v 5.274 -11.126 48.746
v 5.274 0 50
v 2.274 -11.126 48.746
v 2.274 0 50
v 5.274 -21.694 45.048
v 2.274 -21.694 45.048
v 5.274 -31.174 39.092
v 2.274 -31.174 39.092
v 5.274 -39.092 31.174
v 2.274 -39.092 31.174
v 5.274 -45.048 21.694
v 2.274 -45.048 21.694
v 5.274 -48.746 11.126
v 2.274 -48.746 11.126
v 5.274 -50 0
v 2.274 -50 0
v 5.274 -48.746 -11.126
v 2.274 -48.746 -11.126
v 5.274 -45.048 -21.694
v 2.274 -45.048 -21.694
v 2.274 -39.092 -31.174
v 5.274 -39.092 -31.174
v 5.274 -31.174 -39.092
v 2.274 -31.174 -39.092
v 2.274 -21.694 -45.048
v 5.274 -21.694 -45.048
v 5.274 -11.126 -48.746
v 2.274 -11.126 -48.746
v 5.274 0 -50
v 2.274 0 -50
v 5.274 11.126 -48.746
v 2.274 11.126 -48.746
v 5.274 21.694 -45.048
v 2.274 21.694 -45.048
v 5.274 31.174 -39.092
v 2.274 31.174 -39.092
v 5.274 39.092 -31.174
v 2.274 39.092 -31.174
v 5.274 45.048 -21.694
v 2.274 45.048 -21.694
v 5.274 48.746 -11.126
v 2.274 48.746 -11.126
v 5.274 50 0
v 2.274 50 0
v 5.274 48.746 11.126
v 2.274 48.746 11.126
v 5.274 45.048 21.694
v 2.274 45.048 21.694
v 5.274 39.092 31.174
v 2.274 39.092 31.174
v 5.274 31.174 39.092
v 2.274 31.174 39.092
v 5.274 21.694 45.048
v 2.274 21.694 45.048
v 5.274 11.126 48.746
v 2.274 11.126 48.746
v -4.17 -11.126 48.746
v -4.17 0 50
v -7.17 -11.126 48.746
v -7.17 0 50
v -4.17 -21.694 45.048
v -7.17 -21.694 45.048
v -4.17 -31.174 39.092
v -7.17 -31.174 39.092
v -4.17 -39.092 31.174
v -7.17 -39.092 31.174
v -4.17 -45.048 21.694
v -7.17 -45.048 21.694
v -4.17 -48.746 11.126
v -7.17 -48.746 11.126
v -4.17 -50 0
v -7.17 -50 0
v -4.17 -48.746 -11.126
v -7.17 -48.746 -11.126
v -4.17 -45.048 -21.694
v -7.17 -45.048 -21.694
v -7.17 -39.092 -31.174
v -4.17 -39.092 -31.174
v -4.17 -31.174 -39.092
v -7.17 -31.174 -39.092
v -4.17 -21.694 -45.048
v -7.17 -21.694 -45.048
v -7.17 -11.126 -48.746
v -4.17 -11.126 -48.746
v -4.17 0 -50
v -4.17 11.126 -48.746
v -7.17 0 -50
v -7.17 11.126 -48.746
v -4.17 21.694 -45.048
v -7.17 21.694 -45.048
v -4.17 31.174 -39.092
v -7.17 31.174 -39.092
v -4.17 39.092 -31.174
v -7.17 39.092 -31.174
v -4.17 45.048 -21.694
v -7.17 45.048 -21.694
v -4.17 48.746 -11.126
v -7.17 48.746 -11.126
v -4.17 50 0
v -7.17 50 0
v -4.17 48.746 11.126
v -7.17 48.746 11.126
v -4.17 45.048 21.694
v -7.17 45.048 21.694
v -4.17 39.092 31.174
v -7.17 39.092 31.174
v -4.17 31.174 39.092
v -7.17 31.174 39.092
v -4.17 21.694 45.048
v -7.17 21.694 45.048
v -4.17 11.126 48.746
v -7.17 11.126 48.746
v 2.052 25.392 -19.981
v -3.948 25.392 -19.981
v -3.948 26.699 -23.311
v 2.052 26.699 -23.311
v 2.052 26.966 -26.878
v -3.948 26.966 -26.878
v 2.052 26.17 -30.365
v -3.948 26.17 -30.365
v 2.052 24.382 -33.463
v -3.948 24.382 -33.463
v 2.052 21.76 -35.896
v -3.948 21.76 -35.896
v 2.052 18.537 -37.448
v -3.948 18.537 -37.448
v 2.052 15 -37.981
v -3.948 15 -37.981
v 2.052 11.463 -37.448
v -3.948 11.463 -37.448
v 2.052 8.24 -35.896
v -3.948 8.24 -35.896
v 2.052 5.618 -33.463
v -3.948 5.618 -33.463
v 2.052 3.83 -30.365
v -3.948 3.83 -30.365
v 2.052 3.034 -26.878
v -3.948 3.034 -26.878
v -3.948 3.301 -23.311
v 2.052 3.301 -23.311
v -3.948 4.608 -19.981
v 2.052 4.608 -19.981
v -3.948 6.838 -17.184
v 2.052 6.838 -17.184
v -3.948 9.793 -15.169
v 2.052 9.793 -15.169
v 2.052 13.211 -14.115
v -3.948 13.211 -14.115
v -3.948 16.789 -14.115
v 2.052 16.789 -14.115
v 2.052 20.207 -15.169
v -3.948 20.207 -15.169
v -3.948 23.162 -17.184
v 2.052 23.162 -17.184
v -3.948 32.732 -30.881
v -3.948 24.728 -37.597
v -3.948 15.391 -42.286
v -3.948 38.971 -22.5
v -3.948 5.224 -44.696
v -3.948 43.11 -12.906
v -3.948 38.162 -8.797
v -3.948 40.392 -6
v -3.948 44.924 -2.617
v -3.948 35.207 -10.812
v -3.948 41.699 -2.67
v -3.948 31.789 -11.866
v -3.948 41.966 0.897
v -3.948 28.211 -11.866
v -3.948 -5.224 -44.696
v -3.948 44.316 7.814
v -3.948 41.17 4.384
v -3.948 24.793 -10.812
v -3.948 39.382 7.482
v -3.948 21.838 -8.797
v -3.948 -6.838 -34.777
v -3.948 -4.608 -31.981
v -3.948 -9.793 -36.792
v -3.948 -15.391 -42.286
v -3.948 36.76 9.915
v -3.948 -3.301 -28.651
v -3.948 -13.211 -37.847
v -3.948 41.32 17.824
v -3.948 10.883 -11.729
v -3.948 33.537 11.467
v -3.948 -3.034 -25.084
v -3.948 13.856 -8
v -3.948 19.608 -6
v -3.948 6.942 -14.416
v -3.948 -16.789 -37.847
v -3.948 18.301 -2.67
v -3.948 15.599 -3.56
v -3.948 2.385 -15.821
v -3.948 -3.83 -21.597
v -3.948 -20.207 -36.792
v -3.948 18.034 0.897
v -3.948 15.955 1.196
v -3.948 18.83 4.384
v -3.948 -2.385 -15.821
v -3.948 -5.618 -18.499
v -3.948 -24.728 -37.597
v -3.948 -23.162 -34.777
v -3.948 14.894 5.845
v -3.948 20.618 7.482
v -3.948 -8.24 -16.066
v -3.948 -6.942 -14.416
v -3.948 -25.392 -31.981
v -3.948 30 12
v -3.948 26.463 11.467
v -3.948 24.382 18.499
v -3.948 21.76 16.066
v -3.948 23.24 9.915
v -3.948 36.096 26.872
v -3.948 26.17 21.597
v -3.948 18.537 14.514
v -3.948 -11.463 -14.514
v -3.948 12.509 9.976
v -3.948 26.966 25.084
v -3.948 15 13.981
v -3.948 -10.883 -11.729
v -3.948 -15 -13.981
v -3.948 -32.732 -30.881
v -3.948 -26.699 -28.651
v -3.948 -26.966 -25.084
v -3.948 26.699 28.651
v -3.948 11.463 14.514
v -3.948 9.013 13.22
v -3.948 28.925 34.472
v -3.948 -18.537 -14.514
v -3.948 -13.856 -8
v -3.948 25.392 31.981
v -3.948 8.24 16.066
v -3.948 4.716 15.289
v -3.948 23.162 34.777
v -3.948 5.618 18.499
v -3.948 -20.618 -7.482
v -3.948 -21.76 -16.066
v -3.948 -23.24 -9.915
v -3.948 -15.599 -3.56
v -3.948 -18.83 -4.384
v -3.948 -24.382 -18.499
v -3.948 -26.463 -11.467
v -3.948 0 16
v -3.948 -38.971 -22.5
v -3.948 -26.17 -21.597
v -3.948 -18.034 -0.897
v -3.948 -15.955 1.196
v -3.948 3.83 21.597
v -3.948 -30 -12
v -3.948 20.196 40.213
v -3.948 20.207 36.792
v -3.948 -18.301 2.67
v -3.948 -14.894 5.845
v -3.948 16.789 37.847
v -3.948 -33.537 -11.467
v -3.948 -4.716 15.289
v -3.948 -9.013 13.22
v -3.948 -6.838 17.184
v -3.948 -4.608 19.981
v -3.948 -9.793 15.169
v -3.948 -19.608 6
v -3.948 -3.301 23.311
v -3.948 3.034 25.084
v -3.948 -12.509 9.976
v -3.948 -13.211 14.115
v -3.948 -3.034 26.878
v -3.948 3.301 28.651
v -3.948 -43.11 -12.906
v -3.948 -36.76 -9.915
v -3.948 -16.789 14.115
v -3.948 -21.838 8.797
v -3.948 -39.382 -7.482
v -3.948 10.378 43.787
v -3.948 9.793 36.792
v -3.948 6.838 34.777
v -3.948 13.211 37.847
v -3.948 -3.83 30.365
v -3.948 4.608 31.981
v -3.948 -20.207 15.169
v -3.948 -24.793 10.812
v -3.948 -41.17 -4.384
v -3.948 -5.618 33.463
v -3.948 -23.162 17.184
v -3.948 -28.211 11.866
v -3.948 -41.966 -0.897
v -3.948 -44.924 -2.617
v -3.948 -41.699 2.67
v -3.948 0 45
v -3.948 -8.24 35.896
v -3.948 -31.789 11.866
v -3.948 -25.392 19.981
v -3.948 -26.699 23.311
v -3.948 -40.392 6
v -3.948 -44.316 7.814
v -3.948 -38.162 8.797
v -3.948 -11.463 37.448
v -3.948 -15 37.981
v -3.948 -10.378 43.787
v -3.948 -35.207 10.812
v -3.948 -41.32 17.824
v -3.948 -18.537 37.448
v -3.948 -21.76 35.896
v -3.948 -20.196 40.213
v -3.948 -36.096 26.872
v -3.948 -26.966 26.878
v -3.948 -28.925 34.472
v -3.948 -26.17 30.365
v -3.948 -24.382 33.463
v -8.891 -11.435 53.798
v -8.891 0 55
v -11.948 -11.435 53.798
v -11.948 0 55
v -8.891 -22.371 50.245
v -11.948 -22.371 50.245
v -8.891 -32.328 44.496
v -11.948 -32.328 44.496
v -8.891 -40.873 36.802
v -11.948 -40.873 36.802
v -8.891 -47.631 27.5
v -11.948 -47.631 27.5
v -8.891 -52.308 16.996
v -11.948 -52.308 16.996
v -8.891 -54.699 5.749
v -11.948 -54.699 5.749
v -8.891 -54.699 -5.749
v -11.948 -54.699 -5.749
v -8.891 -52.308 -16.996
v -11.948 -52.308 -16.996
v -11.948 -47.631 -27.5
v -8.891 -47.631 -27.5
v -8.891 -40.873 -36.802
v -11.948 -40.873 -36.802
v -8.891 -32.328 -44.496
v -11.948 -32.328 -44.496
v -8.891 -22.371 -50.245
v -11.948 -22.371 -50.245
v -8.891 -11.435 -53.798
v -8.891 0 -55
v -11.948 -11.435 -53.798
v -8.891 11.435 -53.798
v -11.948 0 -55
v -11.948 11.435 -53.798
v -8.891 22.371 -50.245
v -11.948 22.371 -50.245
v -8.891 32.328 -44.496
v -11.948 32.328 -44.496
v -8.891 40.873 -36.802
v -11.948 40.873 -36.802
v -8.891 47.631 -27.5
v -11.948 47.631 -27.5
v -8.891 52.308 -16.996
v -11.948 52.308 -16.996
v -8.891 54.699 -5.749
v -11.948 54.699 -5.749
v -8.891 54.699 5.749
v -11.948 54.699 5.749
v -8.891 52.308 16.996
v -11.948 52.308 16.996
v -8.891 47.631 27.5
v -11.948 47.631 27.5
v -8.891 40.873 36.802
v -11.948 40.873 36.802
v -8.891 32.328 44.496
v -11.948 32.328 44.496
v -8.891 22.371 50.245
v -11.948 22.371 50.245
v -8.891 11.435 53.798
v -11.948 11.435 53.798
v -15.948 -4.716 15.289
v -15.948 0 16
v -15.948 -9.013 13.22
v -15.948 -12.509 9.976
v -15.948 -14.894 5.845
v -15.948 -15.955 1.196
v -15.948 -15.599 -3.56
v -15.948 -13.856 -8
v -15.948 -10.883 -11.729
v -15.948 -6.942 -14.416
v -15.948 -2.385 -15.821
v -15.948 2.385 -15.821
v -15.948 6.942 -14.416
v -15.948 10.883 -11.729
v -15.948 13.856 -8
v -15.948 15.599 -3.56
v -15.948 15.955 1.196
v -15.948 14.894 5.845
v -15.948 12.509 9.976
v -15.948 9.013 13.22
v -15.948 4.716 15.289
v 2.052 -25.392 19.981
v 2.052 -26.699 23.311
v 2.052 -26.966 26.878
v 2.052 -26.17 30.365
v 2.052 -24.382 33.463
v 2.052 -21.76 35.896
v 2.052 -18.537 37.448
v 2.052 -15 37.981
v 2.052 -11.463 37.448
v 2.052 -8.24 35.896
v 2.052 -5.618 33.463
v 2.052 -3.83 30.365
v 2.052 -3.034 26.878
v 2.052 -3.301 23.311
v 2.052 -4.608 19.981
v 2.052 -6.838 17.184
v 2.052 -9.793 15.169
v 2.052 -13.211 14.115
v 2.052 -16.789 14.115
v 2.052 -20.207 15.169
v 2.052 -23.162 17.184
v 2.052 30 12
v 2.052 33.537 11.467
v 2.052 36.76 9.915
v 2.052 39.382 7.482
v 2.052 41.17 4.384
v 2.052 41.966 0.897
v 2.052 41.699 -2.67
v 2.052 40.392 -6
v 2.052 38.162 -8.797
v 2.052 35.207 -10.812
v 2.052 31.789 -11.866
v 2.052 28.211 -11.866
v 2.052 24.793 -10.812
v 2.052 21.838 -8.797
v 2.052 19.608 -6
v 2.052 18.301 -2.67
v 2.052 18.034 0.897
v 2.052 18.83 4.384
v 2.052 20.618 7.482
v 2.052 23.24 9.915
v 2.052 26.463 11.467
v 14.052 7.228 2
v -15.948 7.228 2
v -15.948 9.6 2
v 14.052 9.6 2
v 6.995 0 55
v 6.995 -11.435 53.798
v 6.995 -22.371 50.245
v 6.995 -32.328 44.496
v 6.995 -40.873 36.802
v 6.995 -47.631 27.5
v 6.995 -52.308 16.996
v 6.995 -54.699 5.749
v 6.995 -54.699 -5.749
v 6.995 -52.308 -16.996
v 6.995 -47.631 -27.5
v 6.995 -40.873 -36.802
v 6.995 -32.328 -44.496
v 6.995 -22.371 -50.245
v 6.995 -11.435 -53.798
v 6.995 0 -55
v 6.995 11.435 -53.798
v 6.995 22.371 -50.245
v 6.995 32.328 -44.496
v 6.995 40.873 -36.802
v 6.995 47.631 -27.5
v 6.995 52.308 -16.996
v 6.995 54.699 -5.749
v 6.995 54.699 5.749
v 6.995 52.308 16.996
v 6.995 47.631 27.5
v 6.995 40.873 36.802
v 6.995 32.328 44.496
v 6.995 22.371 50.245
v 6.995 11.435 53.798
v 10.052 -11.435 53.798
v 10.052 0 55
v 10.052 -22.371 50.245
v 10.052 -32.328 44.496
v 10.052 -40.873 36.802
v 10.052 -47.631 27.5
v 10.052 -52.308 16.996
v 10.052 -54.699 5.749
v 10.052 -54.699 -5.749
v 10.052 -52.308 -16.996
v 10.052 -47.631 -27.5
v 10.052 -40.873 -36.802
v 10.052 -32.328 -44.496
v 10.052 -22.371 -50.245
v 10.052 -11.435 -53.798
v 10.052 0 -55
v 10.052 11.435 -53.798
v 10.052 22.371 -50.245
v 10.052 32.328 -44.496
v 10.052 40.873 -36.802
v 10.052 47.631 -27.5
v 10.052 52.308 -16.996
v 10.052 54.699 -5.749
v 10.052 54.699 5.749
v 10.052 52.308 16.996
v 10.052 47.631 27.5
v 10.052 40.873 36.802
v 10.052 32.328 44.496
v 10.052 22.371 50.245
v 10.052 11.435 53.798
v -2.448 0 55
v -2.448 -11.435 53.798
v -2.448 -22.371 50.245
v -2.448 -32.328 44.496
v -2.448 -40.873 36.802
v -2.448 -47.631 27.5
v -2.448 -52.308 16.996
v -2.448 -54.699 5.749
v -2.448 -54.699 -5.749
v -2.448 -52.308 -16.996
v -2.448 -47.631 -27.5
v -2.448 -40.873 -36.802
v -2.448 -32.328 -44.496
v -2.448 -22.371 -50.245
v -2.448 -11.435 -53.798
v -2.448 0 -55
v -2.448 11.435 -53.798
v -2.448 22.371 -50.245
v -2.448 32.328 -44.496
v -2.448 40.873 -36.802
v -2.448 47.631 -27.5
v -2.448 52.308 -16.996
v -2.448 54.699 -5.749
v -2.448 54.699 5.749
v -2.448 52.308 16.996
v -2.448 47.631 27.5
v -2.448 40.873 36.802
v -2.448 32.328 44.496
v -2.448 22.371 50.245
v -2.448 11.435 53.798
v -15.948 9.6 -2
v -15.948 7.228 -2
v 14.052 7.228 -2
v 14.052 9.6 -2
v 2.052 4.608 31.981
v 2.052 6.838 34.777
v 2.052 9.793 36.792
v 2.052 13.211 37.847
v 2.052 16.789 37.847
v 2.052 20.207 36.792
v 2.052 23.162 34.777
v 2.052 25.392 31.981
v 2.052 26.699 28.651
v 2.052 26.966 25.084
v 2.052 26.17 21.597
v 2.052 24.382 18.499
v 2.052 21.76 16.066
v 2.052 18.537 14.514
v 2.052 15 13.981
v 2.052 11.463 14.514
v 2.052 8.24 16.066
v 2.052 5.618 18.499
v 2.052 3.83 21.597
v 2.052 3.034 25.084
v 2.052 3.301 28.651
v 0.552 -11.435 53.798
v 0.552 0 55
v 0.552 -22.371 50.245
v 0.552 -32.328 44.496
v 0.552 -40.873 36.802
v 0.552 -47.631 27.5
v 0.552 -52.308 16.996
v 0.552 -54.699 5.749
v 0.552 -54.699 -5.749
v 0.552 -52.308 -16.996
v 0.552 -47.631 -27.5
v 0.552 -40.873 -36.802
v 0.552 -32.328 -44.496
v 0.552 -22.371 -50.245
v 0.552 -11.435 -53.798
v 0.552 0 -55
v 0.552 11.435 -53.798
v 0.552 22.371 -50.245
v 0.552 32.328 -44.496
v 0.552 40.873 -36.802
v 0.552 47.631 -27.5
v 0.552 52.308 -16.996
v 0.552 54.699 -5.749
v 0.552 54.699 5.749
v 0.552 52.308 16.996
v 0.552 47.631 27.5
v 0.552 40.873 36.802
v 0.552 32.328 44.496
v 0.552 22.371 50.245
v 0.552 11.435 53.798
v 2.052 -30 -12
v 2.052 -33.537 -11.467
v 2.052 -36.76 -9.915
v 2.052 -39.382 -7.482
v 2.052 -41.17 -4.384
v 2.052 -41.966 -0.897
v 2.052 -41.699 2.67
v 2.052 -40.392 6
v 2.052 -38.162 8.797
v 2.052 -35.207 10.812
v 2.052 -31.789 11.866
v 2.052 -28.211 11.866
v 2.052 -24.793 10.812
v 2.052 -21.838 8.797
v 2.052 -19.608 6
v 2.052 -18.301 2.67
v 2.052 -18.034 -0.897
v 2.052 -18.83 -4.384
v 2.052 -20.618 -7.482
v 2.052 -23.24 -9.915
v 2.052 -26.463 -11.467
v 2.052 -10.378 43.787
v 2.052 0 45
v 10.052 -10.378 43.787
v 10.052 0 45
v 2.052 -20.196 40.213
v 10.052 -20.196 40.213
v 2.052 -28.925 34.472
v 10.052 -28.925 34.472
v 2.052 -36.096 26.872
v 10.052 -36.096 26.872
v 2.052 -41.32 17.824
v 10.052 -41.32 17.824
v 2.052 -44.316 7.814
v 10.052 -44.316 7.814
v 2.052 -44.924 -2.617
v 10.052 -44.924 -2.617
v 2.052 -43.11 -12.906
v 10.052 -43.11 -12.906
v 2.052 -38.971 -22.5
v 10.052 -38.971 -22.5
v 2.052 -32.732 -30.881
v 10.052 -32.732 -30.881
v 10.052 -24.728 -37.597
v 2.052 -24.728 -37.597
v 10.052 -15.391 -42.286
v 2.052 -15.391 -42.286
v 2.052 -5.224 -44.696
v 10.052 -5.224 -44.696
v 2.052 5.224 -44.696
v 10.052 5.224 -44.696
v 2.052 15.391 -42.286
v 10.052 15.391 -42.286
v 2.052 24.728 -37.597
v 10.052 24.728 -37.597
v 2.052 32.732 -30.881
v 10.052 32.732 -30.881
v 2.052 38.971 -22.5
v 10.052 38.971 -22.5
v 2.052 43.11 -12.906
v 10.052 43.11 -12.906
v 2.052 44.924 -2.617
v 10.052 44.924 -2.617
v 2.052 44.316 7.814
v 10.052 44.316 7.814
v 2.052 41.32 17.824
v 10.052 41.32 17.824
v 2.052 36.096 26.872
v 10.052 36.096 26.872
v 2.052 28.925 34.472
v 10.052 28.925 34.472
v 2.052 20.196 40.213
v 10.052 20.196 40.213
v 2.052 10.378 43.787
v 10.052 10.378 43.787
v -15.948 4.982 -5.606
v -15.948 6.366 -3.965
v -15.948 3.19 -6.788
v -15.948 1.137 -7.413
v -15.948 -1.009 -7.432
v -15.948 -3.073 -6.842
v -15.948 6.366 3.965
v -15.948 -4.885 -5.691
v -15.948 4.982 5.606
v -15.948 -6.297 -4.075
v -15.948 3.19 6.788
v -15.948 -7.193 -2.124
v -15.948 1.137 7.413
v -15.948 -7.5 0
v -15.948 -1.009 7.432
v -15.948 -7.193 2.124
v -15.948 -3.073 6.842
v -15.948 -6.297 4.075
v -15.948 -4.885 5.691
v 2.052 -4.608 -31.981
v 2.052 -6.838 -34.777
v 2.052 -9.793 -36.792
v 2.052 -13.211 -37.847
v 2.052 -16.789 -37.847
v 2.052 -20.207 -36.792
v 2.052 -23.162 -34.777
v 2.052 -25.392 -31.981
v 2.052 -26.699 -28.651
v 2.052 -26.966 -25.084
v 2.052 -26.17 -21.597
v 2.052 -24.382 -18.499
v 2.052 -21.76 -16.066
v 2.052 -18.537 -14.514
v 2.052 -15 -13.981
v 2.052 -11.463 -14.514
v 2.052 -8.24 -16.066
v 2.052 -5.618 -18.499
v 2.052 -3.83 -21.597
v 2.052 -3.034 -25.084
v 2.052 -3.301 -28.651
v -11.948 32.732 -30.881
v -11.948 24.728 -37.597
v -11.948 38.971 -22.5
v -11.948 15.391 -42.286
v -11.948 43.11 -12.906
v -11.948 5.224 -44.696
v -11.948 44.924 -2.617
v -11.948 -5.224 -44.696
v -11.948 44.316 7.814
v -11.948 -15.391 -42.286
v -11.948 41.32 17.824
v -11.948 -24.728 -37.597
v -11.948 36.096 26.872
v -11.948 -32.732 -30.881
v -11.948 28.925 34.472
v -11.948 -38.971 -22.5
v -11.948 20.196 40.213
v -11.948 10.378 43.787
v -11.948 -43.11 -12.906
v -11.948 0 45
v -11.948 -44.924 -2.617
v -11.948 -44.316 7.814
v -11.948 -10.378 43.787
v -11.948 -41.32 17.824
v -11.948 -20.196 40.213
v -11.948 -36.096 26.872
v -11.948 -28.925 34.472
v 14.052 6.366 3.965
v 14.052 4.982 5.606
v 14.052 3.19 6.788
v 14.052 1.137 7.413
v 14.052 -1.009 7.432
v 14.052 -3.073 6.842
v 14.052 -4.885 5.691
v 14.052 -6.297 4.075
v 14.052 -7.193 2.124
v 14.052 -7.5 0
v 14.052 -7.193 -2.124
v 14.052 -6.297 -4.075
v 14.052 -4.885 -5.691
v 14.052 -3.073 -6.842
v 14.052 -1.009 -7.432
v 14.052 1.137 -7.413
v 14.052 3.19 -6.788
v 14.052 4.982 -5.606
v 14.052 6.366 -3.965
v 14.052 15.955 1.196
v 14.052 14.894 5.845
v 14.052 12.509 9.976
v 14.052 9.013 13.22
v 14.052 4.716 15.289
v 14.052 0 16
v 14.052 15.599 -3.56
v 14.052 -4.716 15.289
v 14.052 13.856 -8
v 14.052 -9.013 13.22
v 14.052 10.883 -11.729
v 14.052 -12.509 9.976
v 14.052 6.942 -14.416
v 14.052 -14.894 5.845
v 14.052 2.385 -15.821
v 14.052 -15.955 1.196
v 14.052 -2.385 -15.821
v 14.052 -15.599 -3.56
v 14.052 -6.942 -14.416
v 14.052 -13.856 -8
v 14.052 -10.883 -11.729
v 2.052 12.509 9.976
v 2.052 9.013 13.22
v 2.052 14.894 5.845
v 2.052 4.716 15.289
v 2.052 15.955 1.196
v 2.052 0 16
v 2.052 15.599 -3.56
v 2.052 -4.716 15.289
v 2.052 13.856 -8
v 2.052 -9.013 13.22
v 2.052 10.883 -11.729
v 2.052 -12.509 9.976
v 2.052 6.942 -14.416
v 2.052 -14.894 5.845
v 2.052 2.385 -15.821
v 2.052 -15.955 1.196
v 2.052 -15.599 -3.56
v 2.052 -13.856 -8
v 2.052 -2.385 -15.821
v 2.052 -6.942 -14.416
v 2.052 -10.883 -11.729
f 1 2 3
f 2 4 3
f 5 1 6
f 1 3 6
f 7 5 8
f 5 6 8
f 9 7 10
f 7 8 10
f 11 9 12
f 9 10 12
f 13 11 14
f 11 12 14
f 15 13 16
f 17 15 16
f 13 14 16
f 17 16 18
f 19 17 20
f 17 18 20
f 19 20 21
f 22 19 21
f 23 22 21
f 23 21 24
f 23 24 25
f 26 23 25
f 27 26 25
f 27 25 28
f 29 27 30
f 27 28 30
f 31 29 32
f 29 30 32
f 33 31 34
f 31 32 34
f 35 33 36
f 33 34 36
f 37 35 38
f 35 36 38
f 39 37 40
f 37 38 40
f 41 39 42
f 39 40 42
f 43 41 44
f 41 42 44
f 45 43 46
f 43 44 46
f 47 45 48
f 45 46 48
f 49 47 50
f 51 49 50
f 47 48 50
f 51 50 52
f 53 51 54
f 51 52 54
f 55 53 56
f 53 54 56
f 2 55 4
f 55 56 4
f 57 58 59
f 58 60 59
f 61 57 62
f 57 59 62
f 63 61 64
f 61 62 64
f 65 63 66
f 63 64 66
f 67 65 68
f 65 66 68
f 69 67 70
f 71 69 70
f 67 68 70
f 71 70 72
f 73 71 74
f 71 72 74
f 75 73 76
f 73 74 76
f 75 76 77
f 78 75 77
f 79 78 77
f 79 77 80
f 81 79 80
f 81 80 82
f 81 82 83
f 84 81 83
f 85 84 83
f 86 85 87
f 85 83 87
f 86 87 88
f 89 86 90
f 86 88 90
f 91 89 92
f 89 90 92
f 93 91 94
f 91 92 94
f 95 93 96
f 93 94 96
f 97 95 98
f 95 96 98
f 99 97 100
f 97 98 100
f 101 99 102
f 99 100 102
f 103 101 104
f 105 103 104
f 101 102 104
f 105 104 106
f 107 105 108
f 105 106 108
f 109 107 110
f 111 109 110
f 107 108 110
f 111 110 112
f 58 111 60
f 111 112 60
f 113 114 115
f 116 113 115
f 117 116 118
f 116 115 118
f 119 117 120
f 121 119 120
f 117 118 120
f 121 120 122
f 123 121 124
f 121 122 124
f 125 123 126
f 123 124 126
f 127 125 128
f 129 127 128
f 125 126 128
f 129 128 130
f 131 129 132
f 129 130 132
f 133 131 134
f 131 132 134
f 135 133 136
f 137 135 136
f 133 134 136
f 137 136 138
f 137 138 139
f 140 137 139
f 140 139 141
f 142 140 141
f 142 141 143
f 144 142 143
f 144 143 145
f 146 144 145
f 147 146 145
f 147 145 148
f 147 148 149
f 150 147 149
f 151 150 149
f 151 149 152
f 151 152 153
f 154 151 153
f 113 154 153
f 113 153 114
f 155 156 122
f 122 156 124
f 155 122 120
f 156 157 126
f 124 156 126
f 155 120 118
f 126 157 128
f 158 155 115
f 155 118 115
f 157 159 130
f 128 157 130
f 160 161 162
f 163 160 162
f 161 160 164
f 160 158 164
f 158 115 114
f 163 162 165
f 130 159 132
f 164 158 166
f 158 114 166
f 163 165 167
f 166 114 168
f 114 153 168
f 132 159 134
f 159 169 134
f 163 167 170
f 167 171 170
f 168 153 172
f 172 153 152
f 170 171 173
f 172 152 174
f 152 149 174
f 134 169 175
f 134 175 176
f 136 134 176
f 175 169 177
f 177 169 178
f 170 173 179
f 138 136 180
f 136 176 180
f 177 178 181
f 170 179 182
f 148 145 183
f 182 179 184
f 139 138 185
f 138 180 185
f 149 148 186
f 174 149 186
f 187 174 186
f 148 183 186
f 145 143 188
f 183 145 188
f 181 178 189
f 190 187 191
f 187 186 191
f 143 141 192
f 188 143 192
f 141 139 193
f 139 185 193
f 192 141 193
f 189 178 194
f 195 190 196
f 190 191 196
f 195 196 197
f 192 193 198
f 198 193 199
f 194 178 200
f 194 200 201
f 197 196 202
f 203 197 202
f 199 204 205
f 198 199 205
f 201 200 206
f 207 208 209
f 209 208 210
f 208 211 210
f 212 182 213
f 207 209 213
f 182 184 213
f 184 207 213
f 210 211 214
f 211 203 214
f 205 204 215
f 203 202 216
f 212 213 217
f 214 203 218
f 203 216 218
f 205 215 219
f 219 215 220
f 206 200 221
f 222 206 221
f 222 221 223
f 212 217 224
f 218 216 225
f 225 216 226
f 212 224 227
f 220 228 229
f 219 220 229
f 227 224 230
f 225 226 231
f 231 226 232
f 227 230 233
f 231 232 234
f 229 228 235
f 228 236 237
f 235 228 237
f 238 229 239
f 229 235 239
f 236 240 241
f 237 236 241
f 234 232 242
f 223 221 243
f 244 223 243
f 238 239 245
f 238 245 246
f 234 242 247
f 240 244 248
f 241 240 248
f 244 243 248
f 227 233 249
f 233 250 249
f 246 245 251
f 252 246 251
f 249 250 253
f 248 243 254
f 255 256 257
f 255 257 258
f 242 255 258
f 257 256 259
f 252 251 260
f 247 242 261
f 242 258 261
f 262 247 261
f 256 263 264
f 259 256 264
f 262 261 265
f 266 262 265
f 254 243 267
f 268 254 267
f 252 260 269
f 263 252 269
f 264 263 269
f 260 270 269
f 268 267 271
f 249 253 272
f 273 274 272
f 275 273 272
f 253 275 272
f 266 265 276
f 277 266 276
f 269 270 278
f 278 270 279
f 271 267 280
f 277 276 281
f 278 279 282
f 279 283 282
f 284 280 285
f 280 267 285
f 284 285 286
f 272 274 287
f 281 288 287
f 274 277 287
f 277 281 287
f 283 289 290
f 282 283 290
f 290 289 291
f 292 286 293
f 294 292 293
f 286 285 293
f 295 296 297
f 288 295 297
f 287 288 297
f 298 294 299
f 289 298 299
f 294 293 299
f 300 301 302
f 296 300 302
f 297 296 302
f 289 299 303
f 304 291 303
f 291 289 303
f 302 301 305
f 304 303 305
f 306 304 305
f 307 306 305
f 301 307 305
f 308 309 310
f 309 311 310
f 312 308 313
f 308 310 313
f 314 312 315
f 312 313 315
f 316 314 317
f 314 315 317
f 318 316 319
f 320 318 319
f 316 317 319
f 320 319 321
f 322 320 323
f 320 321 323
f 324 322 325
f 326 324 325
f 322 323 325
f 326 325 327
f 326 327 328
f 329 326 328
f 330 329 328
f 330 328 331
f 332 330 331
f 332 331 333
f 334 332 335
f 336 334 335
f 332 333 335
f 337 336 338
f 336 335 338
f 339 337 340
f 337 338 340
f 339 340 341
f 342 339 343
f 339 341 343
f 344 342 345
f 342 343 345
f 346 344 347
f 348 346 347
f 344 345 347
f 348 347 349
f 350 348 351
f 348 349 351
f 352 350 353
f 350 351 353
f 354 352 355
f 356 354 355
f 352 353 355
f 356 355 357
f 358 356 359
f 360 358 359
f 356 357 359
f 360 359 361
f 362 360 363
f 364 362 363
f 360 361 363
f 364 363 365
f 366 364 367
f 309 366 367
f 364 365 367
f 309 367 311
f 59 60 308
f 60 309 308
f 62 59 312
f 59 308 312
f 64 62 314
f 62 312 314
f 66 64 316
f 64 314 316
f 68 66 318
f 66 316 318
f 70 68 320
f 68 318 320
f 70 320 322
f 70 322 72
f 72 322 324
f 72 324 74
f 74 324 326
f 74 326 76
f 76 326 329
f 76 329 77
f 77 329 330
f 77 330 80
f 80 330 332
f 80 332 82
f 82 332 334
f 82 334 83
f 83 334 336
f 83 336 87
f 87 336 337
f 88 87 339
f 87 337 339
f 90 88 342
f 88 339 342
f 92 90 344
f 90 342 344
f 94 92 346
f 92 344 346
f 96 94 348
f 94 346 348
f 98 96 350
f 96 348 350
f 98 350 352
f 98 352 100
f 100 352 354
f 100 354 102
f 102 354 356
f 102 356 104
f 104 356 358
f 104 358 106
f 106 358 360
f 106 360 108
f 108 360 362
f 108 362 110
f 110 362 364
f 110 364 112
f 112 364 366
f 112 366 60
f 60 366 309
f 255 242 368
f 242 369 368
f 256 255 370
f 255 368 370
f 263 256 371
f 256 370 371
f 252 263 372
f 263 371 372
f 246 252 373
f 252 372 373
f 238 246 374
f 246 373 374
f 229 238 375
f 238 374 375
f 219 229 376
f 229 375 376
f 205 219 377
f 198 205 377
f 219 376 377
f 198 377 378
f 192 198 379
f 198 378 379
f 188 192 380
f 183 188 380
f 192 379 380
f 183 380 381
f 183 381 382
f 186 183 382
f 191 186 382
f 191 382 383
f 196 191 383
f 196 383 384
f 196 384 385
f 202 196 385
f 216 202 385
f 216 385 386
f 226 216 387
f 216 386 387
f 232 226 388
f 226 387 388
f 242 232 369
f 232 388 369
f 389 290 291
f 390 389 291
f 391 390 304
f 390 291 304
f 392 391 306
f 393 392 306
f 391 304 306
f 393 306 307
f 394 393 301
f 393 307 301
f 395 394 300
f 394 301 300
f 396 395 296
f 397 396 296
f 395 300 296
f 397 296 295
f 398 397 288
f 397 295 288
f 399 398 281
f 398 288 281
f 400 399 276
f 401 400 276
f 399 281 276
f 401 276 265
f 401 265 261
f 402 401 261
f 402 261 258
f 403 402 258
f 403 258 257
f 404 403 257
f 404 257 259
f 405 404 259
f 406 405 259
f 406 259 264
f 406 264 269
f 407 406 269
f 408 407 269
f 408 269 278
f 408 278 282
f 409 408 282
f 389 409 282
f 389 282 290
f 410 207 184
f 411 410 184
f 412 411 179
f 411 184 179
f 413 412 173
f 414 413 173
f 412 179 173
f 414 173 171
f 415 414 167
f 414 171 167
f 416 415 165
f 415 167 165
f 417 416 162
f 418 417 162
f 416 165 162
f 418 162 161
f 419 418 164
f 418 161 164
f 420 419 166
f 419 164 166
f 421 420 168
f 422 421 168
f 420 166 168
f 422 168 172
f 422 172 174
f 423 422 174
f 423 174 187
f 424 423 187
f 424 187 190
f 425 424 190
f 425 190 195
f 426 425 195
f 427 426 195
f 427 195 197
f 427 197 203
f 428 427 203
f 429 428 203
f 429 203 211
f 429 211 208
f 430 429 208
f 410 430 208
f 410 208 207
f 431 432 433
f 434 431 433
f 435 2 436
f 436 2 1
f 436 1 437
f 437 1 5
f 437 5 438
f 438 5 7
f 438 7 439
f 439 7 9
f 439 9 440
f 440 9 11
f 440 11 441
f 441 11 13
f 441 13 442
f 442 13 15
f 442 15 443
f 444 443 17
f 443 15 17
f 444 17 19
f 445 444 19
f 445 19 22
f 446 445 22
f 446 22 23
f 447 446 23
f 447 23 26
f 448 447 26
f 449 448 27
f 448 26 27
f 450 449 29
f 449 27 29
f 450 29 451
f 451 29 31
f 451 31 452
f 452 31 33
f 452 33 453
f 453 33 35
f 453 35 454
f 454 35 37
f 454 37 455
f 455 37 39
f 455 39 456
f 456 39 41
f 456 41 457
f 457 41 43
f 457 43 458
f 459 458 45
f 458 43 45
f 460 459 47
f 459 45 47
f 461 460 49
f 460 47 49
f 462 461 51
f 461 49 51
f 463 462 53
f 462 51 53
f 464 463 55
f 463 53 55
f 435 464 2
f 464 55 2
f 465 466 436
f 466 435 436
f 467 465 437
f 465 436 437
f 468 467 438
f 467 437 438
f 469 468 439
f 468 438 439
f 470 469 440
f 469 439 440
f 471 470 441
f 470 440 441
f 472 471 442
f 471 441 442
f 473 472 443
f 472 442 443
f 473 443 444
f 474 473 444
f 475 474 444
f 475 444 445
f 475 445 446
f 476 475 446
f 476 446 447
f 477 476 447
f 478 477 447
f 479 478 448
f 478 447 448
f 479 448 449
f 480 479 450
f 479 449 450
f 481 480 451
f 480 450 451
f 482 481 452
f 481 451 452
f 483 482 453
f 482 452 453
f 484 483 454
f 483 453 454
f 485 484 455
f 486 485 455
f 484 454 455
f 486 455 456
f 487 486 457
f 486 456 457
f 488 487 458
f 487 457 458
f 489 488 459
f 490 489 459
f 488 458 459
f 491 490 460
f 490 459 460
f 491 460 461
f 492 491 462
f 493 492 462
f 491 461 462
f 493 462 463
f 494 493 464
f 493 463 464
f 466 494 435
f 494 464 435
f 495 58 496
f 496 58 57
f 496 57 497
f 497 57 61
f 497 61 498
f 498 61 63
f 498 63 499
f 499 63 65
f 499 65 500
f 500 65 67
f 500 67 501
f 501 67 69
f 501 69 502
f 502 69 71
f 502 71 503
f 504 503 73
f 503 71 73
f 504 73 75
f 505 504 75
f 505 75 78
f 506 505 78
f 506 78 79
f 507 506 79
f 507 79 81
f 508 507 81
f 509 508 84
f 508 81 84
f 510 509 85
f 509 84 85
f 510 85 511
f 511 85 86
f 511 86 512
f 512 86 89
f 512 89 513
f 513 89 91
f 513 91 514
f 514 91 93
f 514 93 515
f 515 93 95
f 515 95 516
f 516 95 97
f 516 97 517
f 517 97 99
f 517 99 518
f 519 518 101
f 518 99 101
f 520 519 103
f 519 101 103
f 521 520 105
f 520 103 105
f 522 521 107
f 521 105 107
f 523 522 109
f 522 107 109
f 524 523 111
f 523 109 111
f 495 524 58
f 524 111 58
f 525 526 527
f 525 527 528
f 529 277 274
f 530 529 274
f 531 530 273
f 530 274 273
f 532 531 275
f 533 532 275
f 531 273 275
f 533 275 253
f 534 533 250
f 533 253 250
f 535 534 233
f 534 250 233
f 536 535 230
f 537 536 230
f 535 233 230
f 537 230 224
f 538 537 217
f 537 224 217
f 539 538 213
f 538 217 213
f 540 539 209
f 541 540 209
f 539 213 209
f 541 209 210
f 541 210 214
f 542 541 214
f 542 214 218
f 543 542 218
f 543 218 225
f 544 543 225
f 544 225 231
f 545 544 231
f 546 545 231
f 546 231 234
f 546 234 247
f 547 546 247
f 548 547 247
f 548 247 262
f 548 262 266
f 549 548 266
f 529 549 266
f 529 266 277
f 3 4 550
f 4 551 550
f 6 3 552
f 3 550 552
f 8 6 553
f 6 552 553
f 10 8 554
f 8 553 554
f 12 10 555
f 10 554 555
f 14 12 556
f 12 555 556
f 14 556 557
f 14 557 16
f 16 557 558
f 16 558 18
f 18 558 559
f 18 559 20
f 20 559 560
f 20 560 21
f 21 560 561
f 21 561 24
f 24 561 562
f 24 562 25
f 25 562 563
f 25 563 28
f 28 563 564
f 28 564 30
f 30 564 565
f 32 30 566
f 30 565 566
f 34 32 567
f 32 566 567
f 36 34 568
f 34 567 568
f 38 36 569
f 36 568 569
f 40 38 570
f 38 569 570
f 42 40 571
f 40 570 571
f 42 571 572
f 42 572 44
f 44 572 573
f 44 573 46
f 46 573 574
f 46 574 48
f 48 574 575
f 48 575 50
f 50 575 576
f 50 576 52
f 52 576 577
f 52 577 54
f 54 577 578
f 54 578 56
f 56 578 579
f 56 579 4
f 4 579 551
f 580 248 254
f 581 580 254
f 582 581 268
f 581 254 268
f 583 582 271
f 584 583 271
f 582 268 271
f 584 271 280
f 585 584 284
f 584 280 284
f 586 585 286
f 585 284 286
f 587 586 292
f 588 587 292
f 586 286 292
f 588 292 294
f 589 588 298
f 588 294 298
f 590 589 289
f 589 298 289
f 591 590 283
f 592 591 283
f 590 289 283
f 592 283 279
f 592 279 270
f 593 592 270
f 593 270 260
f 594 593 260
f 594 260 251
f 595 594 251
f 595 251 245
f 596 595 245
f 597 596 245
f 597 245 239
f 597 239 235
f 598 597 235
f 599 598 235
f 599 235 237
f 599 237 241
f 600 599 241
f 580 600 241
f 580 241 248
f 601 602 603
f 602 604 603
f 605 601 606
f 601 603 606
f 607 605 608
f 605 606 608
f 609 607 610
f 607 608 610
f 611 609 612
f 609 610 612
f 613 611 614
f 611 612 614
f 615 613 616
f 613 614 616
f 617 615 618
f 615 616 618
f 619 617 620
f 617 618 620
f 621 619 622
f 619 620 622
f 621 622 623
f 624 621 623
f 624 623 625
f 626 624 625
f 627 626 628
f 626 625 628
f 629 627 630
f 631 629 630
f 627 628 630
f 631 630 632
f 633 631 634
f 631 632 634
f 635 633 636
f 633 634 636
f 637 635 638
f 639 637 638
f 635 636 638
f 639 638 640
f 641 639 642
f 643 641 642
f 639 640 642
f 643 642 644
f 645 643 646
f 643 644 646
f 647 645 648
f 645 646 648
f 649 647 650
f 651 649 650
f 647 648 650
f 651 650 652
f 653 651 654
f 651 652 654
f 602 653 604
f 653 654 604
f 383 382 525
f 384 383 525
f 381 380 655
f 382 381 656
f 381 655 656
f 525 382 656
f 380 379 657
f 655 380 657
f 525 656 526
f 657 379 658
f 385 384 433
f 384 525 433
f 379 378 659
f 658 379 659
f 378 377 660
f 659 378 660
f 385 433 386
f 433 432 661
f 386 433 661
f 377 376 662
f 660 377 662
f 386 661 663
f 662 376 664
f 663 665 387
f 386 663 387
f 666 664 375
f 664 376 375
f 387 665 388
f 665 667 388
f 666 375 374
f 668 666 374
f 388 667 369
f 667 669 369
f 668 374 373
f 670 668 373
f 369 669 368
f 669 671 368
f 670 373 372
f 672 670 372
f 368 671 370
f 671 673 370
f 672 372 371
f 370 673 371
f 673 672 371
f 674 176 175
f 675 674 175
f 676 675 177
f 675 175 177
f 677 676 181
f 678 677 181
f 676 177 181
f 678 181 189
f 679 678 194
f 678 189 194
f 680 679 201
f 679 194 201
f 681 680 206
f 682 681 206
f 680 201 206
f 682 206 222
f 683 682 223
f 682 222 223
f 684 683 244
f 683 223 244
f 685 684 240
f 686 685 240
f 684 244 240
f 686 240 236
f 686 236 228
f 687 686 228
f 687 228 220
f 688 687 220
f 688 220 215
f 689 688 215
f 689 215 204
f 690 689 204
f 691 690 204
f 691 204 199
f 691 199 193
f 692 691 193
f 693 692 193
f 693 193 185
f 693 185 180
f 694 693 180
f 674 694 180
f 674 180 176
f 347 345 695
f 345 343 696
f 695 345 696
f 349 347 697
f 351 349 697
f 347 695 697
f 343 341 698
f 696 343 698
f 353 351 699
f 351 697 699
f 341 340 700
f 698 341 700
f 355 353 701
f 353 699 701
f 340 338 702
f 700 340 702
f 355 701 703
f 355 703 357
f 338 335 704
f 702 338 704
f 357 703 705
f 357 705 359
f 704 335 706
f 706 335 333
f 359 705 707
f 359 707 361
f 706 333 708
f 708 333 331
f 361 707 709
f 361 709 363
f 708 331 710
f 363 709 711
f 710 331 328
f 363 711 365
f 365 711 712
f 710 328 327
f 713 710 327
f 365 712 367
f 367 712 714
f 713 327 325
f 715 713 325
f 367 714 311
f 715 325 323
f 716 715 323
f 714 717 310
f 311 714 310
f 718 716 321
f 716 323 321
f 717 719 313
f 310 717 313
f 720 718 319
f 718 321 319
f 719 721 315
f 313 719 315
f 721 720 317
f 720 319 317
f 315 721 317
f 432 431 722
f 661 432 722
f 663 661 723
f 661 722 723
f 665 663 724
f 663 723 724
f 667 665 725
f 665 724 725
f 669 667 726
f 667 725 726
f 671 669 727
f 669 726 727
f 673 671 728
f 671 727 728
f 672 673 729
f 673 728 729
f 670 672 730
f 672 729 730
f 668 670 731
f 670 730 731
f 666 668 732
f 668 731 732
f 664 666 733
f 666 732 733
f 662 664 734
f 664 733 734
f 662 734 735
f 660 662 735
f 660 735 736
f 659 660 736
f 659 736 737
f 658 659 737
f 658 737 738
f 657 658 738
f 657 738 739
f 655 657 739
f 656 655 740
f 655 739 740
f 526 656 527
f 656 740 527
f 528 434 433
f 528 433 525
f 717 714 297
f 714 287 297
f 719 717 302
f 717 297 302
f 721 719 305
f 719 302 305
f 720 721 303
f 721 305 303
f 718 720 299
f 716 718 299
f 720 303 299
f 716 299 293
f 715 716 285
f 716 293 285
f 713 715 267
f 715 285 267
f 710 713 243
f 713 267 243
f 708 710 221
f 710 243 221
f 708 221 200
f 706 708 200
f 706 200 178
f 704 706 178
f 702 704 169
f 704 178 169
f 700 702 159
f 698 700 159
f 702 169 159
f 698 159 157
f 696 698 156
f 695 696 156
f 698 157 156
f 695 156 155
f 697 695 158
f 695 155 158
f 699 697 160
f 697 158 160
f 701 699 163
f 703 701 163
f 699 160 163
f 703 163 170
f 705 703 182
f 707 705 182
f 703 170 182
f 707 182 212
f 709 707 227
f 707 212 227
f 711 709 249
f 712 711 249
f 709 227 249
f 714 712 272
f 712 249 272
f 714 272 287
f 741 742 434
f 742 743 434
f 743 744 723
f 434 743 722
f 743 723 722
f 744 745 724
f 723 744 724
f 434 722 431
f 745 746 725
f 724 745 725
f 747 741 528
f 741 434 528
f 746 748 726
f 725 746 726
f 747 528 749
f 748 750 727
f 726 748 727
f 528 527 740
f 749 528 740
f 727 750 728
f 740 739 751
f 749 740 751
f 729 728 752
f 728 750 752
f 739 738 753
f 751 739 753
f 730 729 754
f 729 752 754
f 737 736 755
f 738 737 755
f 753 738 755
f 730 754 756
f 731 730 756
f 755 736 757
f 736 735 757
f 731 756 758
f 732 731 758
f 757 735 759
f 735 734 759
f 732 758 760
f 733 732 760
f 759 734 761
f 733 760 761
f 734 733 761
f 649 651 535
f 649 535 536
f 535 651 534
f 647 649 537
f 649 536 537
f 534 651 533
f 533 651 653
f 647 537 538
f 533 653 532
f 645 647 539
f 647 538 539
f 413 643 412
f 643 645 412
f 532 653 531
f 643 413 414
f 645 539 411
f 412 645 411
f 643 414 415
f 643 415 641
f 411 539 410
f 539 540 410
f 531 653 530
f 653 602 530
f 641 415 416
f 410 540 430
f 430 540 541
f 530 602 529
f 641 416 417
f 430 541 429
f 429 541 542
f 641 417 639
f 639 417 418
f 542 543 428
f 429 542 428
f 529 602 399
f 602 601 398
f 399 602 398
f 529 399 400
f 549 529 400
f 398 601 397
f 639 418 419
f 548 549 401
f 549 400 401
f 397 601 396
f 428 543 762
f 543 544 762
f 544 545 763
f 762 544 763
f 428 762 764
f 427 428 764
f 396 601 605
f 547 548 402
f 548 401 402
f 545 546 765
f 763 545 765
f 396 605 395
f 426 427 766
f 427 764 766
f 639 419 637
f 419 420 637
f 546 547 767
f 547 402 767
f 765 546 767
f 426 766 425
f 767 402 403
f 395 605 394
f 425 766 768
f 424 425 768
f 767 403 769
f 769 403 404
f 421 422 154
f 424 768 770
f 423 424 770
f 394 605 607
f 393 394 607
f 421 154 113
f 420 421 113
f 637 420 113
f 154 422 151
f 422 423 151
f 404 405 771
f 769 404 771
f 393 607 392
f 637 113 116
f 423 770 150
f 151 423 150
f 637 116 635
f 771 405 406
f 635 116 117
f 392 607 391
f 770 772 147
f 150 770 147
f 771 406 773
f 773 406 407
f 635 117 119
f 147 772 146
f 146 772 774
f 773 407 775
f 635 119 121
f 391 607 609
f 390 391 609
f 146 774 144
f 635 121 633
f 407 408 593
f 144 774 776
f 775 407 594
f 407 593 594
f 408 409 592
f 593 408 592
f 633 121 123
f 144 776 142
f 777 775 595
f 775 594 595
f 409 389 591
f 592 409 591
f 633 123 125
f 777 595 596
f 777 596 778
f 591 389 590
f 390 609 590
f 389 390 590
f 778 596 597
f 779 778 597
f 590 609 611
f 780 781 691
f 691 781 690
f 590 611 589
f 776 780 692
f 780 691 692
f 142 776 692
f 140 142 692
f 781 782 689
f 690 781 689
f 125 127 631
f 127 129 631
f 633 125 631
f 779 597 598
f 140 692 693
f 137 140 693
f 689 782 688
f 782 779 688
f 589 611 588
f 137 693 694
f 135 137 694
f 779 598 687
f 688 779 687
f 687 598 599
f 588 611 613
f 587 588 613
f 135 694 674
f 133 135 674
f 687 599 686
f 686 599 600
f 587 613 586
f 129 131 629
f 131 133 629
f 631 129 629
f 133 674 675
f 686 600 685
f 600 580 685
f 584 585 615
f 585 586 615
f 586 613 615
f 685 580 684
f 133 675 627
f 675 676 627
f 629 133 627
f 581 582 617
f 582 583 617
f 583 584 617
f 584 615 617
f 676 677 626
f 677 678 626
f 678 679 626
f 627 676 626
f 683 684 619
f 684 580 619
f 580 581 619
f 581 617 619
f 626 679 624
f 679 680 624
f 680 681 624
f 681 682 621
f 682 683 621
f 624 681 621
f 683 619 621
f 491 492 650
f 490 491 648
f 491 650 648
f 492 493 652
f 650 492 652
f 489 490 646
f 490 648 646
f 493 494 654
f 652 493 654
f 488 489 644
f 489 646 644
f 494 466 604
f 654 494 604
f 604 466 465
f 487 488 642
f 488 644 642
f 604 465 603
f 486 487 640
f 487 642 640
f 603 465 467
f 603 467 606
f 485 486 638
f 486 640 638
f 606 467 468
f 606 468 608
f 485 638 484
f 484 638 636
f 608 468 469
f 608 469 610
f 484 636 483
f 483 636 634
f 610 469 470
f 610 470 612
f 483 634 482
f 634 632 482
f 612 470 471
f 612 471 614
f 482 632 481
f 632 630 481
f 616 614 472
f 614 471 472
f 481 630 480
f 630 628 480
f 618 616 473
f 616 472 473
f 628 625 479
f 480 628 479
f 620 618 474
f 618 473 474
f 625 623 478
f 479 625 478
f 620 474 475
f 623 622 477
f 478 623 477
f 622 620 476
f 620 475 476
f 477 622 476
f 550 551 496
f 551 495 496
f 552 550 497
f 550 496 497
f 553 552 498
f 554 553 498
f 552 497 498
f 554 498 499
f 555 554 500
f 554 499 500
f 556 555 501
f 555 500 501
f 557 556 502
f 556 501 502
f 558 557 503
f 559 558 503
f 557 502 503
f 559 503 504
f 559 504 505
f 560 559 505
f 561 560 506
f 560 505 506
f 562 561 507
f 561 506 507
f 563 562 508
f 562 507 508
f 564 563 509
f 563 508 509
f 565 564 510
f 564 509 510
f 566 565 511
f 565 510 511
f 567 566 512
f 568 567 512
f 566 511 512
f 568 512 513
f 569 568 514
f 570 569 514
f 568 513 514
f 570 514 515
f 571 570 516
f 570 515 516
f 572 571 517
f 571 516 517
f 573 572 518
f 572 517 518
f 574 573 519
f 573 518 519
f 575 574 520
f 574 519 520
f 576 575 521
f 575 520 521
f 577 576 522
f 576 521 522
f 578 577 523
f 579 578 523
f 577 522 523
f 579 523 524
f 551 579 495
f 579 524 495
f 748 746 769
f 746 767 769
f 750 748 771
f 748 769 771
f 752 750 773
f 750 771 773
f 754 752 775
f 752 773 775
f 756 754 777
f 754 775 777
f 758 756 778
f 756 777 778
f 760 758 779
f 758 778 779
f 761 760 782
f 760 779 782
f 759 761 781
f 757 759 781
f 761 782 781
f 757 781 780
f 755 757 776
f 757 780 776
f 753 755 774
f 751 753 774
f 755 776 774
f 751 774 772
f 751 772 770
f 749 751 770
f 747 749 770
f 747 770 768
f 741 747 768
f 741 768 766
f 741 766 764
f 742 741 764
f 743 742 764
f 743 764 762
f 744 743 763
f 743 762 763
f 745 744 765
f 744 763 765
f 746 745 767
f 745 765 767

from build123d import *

# Parameters (mm, degrees)
SKETCH_6_W               = 4
SKETCH_6_H               = 9.6
CUT_EXTRUDE_4_DEPTH      = 84.366660003
SKETCH_7_R               = 12
CUT_EXTRUDE_7_DEPTH      = 80.837334625
PATTERN_CIRCULAR_2_COUNT = 6


with BuildPart() as part:
    # 草图5 → 旋转4 (revolve)
    with BuildSketch(Plane.XY):
        Polygon((-15.948135722, 7.5), (14.051864278, 7.5), (14.051864278, 16), (2.051864278, 16), (2.051864278, 45), (10.051864278, 45), (10.051864278, 55), (6.995140411, 55), (5.273502344, 50), (2.273502344, 50), (0.551864278, 55), (-2.448135722, 55), (-4.169773789, 50), (-7.169773789, 50), (-8.891411855, 55), (-11.948135722, 55), (-11.948135722, 45), (-3.948135722, 45), (-3.948135722, 16), (-15.948135722, 16), align=None)
    revolve(axis=Axis((-49.922793891, 0, 0), (1, 0, 0)))

    # 草图6 → 切除-拉伸4 (cut, through all)
    with BuildSketch(Plane(origin=(14.051864278, 0, 0), x_dir=(0, 0, -1), z_dir=(1, 0, 0))):
        with Locations((0, 4.8)):
            Rectangle(SKETCH_6_W, SKETCH_6_H)
    extrude(amount=-CUT_EXTRUDE_4_DEPTH, mode=Mode.SUBTRACT)

    # 草图7 → 切除-拉伸7 (cut, through all)
    with BuildSketch(Plane.ZY.offset(3.948135722)):
        with Locations((0, 30)):
            Circle(SKETCH_7_R)
    cut_extrude_7 = extrude(amount=-CUT_EXTRUDE_7_DEPTH, mode=Mode.SUBTRACT)

    # 阵列(圆周)2: 切除-拉伸7 ×6 about axis
    pattern_circular_2_axis = Axis((0, 0, 0), (-1, 0, 0))
    for i in range(1, PATTERN_CIRCULAR_2_COUNT):
        add(cut_extrude_7.rotate(pattern_circular_2_axis, i * 360 / PATTERN_CIRCULAR_2_COUNT), mode=Mode.SUBTRACT)


solid = part.part
